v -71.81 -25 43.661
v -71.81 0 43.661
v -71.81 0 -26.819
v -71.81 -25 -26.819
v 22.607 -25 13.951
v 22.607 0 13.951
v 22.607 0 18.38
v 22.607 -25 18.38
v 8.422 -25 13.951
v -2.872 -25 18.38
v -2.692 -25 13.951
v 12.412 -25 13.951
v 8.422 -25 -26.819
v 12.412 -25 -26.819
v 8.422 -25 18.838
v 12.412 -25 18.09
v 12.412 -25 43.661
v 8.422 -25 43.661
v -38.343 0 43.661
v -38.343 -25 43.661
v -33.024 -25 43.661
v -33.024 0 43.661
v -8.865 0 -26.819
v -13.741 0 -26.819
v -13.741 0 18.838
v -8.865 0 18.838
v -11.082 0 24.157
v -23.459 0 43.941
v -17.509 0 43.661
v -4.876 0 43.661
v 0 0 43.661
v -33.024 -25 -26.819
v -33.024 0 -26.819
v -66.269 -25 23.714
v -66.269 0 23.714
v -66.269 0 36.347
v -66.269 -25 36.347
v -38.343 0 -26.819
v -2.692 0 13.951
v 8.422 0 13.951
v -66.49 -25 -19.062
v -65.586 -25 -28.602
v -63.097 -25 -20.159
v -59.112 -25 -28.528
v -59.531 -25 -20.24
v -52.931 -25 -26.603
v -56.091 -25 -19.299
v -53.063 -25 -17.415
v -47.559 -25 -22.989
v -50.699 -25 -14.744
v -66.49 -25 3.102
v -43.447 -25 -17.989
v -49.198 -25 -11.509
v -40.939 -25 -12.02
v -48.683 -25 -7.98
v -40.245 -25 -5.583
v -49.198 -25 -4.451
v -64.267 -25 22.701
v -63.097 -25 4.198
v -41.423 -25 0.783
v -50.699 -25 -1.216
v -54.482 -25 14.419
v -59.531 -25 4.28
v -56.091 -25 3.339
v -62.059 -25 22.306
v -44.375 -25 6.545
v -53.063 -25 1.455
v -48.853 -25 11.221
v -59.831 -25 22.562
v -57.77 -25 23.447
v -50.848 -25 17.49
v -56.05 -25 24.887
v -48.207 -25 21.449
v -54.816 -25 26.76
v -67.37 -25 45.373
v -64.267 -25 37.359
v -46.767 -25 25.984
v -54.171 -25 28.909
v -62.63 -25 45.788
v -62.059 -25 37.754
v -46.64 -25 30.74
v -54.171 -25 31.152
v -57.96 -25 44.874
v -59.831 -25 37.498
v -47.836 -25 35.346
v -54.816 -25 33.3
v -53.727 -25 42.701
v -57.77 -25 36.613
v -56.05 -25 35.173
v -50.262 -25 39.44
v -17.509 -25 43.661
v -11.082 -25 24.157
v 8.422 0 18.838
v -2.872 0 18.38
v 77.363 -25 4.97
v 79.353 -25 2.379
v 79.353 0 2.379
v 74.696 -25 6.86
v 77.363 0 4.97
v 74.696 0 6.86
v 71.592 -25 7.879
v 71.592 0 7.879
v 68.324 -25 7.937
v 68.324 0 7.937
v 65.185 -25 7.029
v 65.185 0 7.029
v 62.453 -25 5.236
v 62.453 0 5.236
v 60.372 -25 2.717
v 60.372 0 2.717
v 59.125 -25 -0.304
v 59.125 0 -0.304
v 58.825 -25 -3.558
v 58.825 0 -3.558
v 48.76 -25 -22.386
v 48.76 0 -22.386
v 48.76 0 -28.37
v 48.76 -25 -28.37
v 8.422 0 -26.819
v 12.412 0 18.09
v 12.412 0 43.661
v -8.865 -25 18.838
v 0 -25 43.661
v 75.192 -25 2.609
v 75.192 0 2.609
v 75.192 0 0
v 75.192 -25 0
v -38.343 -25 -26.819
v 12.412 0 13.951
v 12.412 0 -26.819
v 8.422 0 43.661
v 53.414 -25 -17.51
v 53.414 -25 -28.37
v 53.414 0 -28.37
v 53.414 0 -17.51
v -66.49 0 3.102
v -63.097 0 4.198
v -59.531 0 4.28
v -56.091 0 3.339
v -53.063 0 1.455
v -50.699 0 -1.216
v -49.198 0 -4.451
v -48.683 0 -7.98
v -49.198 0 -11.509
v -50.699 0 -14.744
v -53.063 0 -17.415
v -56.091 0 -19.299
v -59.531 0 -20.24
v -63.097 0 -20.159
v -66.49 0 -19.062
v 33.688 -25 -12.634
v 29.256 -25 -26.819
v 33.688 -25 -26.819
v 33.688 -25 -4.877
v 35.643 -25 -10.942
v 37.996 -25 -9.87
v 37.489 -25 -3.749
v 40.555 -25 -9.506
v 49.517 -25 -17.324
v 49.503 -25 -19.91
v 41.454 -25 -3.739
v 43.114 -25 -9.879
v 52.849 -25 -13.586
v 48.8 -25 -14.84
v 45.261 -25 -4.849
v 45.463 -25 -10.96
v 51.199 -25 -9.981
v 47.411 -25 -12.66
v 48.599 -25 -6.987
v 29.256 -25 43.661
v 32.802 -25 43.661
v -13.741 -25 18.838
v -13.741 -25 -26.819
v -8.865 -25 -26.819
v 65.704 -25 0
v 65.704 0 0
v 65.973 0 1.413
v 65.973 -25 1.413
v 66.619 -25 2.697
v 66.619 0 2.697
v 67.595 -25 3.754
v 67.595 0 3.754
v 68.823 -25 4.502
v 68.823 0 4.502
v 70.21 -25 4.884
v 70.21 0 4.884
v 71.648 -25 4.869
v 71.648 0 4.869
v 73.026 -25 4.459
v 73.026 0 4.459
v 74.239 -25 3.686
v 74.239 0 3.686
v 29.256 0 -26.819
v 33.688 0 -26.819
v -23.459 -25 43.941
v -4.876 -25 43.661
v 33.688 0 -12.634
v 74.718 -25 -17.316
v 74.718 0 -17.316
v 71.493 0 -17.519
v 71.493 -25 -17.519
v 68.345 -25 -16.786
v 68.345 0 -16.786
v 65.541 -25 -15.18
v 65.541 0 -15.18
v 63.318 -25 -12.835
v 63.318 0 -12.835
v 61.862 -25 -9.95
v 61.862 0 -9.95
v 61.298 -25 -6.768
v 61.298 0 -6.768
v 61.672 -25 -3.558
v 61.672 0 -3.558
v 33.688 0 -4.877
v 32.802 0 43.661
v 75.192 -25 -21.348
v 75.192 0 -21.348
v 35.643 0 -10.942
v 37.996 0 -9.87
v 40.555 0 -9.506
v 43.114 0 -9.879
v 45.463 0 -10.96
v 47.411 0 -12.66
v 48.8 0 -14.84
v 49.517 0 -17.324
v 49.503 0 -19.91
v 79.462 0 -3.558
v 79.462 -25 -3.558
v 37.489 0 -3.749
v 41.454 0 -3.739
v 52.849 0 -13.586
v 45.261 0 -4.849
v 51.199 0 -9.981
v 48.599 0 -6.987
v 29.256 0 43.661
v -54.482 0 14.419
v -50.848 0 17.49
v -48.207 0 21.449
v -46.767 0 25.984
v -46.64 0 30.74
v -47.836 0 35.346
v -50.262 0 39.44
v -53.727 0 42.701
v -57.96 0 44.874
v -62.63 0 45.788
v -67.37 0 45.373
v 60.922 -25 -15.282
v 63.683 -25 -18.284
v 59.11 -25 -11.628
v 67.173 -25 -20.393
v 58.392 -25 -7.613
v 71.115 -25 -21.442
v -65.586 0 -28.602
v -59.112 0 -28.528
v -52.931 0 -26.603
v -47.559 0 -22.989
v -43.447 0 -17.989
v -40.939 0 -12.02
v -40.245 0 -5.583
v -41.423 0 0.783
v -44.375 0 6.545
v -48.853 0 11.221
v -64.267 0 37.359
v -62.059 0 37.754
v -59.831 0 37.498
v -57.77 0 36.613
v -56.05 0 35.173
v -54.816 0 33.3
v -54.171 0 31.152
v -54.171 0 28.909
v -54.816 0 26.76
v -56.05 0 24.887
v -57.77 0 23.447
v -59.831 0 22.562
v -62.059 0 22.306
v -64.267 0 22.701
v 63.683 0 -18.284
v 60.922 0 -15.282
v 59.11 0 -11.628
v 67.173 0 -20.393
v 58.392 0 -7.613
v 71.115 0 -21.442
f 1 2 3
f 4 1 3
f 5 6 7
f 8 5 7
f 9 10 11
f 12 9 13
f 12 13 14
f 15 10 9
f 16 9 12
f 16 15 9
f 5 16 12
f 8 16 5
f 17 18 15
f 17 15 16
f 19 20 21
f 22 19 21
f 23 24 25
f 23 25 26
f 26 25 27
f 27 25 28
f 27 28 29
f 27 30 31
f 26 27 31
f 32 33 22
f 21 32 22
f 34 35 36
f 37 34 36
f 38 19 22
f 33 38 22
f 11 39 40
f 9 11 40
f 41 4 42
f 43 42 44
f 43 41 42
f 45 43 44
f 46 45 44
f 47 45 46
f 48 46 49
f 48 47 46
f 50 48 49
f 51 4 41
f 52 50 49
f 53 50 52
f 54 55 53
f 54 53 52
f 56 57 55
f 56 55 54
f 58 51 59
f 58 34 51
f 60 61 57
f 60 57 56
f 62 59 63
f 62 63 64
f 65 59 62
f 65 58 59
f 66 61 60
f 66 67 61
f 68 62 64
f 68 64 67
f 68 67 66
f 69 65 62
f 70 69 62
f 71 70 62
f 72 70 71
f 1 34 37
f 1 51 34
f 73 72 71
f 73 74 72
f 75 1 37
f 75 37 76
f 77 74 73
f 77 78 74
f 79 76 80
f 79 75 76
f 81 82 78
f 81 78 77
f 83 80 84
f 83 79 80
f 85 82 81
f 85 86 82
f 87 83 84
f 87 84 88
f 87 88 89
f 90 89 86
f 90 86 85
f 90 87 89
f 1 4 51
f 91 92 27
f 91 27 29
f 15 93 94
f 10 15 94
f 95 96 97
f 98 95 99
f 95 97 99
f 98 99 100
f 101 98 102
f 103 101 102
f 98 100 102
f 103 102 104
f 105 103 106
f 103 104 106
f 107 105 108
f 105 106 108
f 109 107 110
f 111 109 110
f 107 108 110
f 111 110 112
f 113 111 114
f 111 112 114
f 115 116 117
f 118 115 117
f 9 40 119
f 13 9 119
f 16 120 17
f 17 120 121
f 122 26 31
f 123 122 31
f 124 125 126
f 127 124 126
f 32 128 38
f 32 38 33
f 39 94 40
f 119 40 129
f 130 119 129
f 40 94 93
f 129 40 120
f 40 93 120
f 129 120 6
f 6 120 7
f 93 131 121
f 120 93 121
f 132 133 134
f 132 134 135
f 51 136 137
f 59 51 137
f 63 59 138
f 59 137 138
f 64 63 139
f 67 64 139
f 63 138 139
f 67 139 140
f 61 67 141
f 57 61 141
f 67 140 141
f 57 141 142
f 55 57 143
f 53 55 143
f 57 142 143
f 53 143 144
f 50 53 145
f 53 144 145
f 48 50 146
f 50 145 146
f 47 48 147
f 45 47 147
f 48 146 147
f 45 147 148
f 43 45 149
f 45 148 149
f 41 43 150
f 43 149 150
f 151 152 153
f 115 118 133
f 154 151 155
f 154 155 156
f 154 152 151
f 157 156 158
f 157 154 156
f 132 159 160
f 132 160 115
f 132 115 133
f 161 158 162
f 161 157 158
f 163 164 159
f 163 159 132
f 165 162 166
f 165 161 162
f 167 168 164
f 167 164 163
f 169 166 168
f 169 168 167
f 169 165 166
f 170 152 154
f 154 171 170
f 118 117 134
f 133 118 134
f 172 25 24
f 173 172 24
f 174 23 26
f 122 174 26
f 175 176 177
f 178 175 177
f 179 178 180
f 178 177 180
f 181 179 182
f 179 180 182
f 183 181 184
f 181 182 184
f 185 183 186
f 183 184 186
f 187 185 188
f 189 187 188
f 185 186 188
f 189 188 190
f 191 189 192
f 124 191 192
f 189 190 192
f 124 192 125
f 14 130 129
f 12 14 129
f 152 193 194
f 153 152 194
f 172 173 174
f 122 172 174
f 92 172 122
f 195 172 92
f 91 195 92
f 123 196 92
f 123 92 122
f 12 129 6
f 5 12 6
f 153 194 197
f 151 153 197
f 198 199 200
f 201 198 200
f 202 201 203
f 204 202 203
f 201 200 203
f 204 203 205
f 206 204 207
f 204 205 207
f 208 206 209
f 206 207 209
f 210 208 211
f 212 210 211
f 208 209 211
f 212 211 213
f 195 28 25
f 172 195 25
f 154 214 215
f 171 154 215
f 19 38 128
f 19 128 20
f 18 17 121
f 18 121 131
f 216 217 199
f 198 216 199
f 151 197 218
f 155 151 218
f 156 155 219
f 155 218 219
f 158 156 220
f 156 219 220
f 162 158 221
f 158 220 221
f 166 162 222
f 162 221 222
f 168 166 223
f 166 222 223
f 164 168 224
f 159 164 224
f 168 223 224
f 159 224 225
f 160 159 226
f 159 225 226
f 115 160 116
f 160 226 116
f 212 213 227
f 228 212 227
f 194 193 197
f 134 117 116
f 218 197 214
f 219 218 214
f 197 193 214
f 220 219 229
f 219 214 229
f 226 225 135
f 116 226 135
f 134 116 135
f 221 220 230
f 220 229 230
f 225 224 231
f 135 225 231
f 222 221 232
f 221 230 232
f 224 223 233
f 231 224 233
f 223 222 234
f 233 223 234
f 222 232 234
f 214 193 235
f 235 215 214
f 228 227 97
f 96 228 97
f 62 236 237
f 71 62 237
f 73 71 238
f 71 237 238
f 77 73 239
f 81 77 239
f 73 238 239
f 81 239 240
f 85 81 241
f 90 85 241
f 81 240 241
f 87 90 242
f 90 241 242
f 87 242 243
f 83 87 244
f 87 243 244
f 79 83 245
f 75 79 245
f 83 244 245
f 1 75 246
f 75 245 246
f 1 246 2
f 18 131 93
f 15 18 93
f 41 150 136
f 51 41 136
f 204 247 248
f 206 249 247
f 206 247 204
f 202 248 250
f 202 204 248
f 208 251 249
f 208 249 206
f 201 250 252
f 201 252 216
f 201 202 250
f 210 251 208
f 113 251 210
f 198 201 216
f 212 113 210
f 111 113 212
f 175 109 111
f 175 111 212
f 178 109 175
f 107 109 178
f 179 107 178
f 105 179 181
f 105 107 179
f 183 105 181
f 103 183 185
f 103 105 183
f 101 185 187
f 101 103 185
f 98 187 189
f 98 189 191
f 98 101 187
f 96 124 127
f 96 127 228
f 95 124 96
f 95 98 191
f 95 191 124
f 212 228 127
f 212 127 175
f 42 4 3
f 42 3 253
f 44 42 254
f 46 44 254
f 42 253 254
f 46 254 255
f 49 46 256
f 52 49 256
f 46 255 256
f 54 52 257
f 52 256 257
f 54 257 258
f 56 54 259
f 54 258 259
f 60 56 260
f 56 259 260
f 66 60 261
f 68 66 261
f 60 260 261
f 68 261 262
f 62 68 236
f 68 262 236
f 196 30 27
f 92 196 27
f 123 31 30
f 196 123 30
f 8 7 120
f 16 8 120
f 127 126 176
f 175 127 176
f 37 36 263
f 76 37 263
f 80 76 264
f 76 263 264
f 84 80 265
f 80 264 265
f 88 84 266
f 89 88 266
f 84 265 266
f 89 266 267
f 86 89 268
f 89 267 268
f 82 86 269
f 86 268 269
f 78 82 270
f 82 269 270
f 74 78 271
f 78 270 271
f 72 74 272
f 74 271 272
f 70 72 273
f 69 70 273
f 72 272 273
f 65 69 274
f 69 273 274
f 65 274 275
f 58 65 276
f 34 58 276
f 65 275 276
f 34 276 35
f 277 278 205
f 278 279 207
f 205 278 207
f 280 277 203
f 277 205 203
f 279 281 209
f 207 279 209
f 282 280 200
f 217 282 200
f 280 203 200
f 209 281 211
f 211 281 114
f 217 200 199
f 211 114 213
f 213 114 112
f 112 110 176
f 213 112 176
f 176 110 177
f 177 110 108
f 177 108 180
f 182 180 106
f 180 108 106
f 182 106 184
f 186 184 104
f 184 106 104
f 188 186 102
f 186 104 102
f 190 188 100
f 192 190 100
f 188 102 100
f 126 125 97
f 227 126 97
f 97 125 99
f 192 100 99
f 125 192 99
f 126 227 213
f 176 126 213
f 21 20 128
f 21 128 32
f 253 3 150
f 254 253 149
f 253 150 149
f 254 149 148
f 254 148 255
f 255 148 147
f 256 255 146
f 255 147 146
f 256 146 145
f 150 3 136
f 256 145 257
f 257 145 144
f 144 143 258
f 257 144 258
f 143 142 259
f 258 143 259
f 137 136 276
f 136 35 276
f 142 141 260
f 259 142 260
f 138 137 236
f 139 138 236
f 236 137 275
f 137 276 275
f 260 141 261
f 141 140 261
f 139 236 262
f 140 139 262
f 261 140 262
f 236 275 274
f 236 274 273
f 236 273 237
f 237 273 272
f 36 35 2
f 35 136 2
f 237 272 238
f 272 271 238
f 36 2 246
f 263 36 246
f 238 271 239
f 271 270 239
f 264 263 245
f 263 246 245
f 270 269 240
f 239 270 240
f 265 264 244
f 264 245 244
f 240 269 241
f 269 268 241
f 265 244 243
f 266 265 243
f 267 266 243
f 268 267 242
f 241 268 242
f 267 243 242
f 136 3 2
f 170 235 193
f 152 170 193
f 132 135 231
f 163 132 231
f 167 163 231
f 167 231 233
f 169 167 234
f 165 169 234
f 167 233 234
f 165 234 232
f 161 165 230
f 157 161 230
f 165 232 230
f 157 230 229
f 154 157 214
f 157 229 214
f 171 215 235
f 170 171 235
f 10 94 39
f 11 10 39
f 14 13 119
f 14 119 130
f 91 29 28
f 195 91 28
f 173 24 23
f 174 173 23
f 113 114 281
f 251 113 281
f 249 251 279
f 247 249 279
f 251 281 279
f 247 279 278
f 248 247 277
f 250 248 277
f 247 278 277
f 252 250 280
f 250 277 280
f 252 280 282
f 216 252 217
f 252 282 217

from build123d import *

# Parameters (mm, degrees)
F1_DEPTH = 25
F0_W     = 5.3192265332
F0_H     = 70.4797282815


with BuildPart() as f1:
    # F0 (on Front) → F1 (new body)
    with BuildSketch(Plane.XZ):
        with BuildLine():
            ThreePointArc((-54.4818983576, 14.4186617885), (-48.9051859477, 37.478036073), (-71.8095302582, 43.6607114971))
            Line((-71.8095302582, 43.6607114971), (-71.8095302582, 13.9617044479))
            ThreePointArc((-71.8095302582, 13.9617044479), (-63.1917663129, 15.9364559562), (-54.4818983576, 14.4186617885))
        make_face()
        with BuildLine():
            Line((-66.2686675787, 23.7136147916), (-66.2686675787, 36.3467745483))
            ThreePointArc((-66.2686675787, 36.3467745483), (-54.0896159927, 30.03019467), (-66.2686675787, 23.7136147916))
        make_face(mode=Mode.SUBTRACT)
        with BuildLine():
            ThreePointArc((-54.4818983576, 14.4186617885), (-63.1917663129, 15.9364559562), (-71.8095302582, 13.9617044479))
            ThreePointArc((-71.8095302582, 13.9617044479), (-63.0831040963, 11.8160299913), (-54.4818983576, 14.4186617885))
        make_face()
        with BuildLine():
            ThreePointArc((-54.4818983576, 14.4186617885), (-63.0831040963, 11.8160299913), (-71.8095302582, 13.9617044479))
            Line((-71.8095302582, 13.9617044479), (-71.8095302582, -26.8190167844))
            ThreePointArc((-71.8095302582, -26.8190167844), (-41.9759547282, -15.0954842688), (-54.4818983576, 14.4186617885))
        make_face()
        with BuildLine():
            Line((-66.4903074503, -19.0618149936), (-66.4903074503, 3.1016212888))
            ThreePointArc((-66.4903074503, 3.1016212888), (-48.6828408255, -7.9800968524), (-66.4903074503, -19.0618149936))
        make_face(mode=Mode.SUBTRACT)
    extrude(amount=F1_DEPTH)


with BuildPart() as f1b:
    # F0 (on Front) → F1, piece 2 (new body)
    with BuildSketch(Plane.XZ):
        with Locations((-35.6831308454, 8.4208473563)):
            Rectangle(F0_W, F0_H)
    extrude(amount=F1_DEPTH)


with BuildPart() as f1c:
    # F0 (on Front) → F1, piece 3 (new body)
    with BuildSketch(Plane.XZ):
        Polygon((-11.0817169771, 24.156883359), (-17.5091139972, 43.6607114971), (-23.459102025, 43.9413224618), (-13.7413293123, 18.8376605511), (-13.7413293123, -26.8190167844), (-8.8653741404, -26.8190167844), (-8.8653741404, 18.8376605511), (0, 43.6607114971), (-4.8759565689, 43.6607114971), align=None)
    extrude(amount=F1_DEPTH)


with BuildPart() as f1d:
    # F0 (on Front) → F1, piece 4 (new body)
    with BuildSketch(Plane.XZ):
        Polygon((12.4115217477, 43.6607114971), (8.4221055731, 43.6607114971), (8.4221055731, 18.8376605511), (-2.8717121823, 18.3804786922), (-2.6924200742, 13.9514044519), (8.4221055731, 13.9514044519), (8.4221055731, -26.8190167844), (12.4115217477, -26.8190167844), (12.4115217477, 13.9514044519), (22.6067043841, 13.9514044519), (22.6067043841, 18.3804786922), (12.4115217477, 18.0900685123), align=None)
    extrude(amount=F1_DEPTH)


with BuildPart() as f1e:
    # F0 (on Front) → F1, piece 5 (new body)
    with BuildSketch(Plane.XZ):
        with BuildLine():
            Line((32.8018814325, 43.6607114971), (29.2557347566, 43.6607114971))
            Line((29.2557347566, 43.6607114971), (29.2557347566, -26.8190167844))
            Line((29.2557347566, -26.8190167844), (33.6884222925, -26.8190167844))
            Line((33.6884222925, -26.8190167844), (33.6884222925, -12.6344179735))
            ThreePointArc((33.6884222925, -12.6344179735), (45.4626689986, -10.9596878338), (48.7595573068, -22.3863292485))
            Line((48.7595573068, -22.3863292485), (48.7595573068, -24.1594035178))
            Line((48.7595573068, -24.1594035178), (48.7595573068, -28.3704567701))
            Line((48.7595573068, -28.3704567701), (53.4138828516, -28.3704567701))
            Line((53.4138828516, -28.3704567701), (53.4138828516, -17.5103731453))
            ThreePointArc((53.4138828516, -17.5103731453), (47.0066920572, -5.7983017991), (33.6884222925, -4.877215717))
            Line((33.6884222925, -4.877215717), (32.8018814325, 43.6607114971))
        make_face()
    extrude(amount=F1_DEPTH)


with BuildPart() as f1f:
    # F0 (on Front) → F1, piece 6 (new body)
    with BuildSketch(Plane.XZ):
        with BuildLine():
            ThreePointArc((79.3531718945, 2.3786725415), (66.7206313165, 7.6005529037), (58.8253028691, -3.5579821561))
            Line((58.8253028691, -3.5579821561), (61.6716891527, -3.5579821561))
            Line((61.6716891527, -3.5579821561), (79.4616043568, -3.5579821561))
            Line((79.4616043568, -3.5579821561), (79.3531718945, 2.3786725415))
        make_face()
        with BuildLine():
            Line((75.1920193434, 0), (65.7040700316, 0))
            ThreePointArc((65.7040700316, 0), (69.5029158711, 4.7414244812), (75.1920193434, 2.6091868058))
            Line((75.1920193434, 2.6091868058), (75.1920193434, 0))
        make_face(mode=Mode.SUBTRACT)
        with BuildLine():
            Line((61.6716891527, -3.5579821561), (58.8253028691, -3.5579821561))
            ThreePointArc((58.8253028691, -3.5579821561), (62.1957480127, -16.8808173187), (75.1920193434, -21.347893402))
            Line((75.1920193434, -21.347893402), (74.7176259756, -17.3155125231))
            ThreePointArc((74.7176259756, -17.3155125231), (64.3439238342, -14.0883059858), (61.6716891527, -3.5579821561))
        make_face()
    extrude(amount=F1_DEPTH)


solid = Compound([f1.part, f1b.part, f1c.part, f1d.part, f1e.part, f1f.part])
